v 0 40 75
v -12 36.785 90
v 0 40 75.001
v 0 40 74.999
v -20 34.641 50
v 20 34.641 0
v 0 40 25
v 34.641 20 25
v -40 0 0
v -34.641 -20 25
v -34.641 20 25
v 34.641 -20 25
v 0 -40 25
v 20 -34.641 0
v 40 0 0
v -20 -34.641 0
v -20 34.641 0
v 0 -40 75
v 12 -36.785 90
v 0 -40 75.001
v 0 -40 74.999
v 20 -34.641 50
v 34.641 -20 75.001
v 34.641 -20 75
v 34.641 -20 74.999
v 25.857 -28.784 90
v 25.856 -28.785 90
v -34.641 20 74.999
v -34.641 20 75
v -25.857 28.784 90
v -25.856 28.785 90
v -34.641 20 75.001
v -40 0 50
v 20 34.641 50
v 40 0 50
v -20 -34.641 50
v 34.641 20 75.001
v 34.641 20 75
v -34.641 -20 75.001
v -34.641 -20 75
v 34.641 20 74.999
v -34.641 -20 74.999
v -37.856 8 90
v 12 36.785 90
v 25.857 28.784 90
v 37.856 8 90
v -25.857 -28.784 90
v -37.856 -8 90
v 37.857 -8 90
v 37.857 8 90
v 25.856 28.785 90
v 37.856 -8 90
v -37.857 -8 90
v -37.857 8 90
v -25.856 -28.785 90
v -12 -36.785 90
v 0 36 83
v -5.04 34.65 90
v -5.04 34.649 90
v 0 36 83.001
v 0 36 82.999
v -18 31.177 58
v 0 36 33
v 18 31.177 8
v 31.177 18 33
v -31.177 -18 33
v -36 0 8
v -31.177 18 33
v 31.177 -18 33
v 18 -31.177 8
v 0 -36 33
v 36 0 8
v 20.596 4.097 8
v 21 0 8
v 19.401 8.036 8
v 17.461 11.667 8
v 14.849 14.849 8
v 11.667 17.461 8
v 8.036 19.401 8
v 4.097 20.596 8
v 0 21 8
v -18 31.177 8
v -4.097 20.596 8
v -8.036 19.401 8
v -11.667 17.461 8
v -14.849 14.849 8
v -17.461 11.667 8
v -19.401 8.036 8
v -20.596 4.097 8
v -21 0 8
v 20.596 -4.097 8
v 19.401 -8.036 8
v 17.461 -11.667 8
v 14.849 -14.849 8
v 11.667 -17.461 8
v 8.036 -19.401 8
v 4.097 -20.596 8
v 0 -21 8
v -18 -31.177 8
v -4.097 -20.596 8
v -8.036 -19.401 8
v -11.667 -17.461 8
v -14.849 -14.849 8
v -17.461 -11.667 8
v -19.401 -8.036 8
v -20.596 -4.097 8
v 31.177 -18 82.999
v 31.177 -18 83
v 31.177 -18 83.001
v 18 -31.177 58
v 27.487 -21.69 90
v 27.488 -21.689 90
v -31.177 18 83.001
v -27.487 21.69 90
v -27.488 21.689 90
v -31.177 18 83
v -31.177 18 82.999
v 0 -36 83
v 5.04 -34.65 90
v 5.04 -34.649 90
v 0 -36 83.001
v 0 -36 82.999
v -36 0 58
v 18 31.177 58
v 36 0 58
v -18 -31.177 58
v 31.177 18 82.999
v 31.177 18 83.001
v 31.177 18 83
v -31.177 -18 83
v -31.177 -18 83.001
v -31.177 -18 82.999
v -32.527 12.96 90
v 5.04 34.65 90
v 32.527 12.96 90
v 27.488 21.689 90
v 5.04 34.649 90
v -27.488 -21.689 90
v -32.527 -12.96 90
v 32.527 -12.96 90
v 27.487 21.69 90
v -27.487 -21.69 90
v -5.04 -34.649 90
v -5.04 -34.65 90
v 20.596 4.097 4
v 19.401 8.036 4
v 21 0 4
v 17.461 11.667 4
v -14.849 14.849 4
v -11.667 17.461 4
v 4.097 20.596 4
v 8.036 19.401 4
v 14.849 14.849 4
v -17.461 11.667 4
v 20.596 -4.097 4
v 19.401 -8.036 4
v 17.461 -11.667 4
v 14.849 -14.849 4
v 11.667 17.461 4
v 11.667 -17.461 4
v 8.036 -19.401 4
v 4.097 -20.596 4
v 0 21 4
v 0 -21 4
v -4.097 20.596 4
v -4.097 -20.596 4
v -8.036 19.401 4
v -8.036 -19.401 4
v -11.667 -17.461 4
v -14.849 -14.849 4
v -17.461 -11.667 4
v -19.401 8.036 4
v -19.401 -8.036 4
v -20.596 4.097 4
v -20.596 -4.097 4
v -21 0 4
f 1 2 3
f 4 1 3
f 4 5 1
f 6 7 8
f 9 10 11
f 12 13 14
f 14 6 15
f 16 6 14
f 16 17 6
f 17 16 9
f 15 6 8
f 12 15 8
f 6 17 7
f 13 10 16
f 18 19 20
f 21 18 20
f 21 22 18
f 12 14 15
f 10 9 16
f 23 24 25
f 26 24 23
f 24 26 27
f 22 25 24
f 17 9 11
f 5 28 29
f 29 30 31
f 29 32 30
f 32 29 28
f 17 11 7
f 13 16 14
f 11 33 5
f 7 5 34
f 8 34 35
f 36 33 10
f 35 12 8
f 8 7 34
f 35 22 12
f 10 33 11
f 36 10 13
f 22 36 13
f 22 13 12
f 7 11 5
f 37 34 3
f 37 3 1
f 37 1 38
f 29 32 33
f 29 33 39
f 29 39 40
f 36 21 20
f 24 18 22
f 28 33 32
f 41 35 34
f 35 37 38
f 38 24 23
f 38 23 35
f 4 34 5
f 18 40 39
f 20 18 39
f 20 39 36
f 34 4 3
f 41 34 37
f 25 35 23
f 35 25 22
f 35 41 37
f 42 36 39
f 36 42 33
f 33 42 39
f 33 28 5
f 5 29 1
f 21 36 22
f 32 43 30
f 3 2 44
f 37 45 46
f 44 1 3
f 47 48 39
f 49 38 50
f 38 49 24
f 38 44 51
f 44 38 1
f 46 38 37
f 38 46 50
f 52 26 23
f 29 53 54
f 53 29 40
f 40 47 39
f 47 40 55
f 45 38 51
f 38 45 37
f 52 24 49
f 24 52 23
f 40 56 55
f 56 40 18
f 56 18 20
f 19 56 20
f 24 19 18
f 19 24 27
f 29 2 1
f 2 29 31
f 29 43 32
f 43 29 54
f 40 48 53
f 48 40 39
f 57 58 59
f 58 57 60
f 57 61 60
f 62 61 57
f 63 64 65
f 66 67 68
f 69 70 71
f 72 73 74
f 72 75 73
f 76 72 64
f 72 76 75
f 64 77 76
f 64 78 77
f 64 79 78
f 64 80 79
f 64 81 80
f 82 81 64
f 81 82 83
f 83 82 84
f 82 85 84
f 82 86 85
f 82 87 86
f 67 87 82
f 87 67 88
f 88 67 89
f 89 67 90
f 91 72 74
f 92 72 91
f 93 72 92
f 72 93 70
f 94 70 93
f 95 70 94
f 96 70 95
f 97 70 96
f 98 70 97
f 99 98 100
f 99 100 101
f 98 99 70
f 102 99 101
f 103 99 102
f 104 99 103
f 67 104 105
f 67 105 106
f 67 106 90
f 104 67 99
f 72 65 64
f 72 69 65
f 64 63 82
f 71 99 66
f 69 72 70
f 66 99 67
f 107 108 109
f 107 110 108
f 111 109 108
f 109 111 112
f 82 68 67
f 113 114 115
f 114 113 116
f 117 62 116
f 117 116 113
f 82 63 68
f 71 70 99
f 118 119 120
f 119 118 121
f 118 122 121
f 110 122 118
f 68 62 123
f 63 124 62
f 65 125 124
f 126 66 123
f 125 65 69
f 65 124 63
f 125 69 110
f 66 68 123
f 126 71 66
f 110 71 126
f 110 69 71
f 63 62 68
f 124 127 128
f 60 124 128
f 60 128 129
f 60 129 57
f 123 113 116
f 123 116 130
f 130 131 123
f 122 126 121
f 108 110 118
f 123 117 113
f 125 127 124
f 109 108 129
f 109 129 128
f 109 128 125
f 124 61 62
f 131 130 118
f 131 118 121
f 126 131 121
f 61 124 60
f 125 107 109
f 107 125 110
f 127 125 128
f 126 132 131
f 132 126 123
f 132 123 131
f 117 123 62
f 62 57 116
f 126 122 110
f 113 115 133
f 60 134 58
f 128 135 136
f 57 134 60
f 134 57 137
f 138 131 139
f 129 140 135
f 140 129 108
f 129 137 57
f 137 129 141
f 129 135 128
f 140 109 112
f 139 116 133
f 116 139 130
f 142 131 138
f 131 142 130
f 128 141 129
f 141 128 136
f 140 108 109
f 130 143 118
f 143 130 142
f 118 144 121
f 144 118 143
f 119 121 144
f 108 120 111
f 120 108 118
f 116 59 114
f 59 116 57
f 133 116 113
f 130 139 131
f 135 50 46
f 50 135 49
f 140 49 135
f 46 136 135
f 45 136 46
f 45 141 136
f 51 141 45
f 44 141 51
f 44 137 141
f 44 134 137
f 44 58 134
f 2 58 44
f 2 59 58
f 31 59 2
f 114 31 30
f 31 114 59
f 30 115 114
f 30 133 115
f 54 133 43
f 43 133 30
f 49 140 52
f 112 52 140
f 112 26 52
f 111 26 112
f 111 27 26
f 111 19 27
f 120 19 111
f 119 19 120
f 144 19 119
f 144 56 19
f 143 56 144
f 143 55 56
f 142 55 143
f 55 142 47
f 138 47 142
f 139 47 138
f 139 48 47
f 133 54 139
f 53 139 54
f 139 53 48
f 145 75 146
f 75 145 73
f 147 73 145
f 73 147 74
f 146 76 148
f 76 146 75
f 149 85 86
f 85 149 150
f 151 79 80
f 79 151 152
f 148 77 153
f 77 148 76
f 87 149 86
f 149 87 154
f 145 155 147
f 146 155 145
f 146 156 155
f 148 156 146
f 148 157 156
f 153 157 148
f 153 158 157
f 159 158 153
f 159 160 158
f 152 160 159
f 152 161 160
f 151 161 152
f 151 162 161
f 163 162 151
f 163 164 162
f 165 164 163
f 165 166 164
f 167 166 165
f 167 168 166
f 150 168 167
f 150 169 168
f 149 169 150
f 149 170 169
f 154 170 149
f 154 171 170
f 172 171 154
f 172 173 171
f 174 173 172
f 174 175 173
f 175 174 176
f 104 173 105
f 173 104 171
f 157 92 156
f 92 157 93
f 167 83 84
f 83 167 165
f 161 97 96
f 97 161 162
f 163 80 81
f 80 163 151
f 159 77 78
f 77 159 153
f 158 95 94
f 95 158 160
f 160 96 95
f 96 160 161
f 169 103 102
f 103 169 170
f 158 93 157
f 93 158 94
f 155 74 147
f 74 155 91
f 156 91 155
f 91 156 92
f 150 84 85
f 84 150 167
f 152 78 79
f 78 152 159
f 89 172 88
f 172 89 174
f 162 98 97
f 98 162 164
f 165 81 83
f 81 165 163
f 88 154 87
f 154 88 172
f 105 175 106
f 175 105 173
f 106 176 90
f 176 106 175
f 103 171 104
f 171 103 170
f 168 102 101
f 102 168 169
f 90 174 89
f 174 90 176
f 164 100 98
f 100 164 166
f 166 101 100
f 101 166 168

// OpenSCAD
$fn = 6;



difference() {
mike();
translate([0, 0, 8]) scale([0.90, 0.9, 1]) mike();

translate([0, 0, s_height*4]) cube([100, 100, 20], center=true);


translate([0, 0, 6]) cylinder(h=04, r1=21,r2=21, center=true, $fn=32);
}





module mike()
{
section();
rotate([0, 0, 30]) translate([0, 0, s_height]) section2(30);
translate([0, 0, s_height*2]) section2(70);
rotate([0, 0, 30]) translate([0, 0, s_height*3]) section2(15);
}


s_radius = 40;
s_height = 25;



module section()
{
	hull()
	{
		cylinder(h=0.001, r1=s_radius,r2=s_radius, center=true);
		rotate([0, 0, 30]) translate([0, 0, s_height]) cylinder(h=0.001, r1=s_radius,r2=s_radius, center=true);
	}
}

module section2()
{
	hull()
	{
		cylinder(h=0.001, r1=s_radius,r2=s_radius, center=true);
		rotate([0, 0, 30]) translate([0, 0, s_height]) cylinder(h=0.001, r1=s_radius,r2=s_radius, center=true);
	}
}


/*
difference() {
mike();
translate([0, 0, 2]) scale([0.90, 0.9, 1]) mike();

translate([0, 0, 20]) cube([100, 100, 1], center=true);

}


module mike()
{
bob();
rotate([0, 0, 30]) translate([0, 0, 5]) bob();
translate([0, 0, 10]) bob();
rotate([0, 0, 30]) translate([0, 0, 15]) bob();
}


module bob()
{
hull() {
cylinder(h=0.001, r1=10,r2=10, center=true);




rotate([0, 0, 30]) translate([0, 0, 5]) cylinder(h=0.001, r1=10,r2=10, center=true);
}


}
*/
